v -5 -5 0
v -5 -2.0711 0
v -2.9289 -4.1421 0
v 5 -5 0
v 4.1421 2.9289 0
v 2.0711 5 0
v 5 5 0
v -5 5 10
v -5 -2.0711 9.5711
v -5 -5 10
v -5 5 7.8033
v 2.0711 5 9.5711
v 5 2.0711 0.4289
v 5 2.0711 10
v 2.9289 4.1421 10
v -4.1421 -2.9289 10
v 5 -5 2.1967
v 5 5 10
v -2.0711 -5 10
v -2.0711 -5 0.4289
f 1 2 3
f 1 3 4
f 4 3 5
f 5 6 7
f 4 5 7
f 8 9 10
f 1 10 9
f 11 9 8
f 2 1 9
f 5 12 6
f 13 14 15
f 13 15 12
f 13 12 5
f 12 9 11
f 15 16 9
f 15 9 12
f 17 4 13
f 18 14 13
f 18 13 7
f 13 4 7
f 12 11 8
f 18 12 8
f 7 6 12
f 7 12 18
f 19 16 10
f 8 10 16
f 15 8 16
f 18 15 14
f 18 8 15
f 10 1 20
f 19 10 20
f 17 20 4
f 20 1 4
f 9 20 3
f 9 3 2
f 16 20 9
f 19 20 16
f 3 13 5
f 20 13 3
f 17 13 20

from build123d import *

# Parameters (mm, degrees)
F0_W          = 10
F0_H          = 10
F1_DEPTH      = 10
F6_DEPTH      = 8.334333
F6_DEPTH_BACK = 8.334333


with BuildPart() as f1:
    # F0 (on Top) → F1 (new body)
    with BuildSketch(Plane.XY):
        Rectangle(F0_W, F0_H)
    extrude(amount=F1_DEPTH)

    # F5 (on face) → F6 (cut, two sides)
    with BuildSketch(Plane(origin=(1.111111, -1.111111, 0.555556), x_dir=(-0.745356, -0.596285, 0.298142), z_dir=(-0.666667, 0.666667, -0.333333))) as f6_sk:
        Polygon((-4.833843, 1.309858), (4.65299, -1.852419), (7.815267, 7.634414), (-1.671566, 10.796691), align=None)
    extrude(amount=F6_DEPTH, mode=Mode.SUBTRACT)
    extrude(f6_sk.sketch, amount=-F6_DEPTH_BACK, mode=Mode.SUBTRACT)


solid = f1.part
